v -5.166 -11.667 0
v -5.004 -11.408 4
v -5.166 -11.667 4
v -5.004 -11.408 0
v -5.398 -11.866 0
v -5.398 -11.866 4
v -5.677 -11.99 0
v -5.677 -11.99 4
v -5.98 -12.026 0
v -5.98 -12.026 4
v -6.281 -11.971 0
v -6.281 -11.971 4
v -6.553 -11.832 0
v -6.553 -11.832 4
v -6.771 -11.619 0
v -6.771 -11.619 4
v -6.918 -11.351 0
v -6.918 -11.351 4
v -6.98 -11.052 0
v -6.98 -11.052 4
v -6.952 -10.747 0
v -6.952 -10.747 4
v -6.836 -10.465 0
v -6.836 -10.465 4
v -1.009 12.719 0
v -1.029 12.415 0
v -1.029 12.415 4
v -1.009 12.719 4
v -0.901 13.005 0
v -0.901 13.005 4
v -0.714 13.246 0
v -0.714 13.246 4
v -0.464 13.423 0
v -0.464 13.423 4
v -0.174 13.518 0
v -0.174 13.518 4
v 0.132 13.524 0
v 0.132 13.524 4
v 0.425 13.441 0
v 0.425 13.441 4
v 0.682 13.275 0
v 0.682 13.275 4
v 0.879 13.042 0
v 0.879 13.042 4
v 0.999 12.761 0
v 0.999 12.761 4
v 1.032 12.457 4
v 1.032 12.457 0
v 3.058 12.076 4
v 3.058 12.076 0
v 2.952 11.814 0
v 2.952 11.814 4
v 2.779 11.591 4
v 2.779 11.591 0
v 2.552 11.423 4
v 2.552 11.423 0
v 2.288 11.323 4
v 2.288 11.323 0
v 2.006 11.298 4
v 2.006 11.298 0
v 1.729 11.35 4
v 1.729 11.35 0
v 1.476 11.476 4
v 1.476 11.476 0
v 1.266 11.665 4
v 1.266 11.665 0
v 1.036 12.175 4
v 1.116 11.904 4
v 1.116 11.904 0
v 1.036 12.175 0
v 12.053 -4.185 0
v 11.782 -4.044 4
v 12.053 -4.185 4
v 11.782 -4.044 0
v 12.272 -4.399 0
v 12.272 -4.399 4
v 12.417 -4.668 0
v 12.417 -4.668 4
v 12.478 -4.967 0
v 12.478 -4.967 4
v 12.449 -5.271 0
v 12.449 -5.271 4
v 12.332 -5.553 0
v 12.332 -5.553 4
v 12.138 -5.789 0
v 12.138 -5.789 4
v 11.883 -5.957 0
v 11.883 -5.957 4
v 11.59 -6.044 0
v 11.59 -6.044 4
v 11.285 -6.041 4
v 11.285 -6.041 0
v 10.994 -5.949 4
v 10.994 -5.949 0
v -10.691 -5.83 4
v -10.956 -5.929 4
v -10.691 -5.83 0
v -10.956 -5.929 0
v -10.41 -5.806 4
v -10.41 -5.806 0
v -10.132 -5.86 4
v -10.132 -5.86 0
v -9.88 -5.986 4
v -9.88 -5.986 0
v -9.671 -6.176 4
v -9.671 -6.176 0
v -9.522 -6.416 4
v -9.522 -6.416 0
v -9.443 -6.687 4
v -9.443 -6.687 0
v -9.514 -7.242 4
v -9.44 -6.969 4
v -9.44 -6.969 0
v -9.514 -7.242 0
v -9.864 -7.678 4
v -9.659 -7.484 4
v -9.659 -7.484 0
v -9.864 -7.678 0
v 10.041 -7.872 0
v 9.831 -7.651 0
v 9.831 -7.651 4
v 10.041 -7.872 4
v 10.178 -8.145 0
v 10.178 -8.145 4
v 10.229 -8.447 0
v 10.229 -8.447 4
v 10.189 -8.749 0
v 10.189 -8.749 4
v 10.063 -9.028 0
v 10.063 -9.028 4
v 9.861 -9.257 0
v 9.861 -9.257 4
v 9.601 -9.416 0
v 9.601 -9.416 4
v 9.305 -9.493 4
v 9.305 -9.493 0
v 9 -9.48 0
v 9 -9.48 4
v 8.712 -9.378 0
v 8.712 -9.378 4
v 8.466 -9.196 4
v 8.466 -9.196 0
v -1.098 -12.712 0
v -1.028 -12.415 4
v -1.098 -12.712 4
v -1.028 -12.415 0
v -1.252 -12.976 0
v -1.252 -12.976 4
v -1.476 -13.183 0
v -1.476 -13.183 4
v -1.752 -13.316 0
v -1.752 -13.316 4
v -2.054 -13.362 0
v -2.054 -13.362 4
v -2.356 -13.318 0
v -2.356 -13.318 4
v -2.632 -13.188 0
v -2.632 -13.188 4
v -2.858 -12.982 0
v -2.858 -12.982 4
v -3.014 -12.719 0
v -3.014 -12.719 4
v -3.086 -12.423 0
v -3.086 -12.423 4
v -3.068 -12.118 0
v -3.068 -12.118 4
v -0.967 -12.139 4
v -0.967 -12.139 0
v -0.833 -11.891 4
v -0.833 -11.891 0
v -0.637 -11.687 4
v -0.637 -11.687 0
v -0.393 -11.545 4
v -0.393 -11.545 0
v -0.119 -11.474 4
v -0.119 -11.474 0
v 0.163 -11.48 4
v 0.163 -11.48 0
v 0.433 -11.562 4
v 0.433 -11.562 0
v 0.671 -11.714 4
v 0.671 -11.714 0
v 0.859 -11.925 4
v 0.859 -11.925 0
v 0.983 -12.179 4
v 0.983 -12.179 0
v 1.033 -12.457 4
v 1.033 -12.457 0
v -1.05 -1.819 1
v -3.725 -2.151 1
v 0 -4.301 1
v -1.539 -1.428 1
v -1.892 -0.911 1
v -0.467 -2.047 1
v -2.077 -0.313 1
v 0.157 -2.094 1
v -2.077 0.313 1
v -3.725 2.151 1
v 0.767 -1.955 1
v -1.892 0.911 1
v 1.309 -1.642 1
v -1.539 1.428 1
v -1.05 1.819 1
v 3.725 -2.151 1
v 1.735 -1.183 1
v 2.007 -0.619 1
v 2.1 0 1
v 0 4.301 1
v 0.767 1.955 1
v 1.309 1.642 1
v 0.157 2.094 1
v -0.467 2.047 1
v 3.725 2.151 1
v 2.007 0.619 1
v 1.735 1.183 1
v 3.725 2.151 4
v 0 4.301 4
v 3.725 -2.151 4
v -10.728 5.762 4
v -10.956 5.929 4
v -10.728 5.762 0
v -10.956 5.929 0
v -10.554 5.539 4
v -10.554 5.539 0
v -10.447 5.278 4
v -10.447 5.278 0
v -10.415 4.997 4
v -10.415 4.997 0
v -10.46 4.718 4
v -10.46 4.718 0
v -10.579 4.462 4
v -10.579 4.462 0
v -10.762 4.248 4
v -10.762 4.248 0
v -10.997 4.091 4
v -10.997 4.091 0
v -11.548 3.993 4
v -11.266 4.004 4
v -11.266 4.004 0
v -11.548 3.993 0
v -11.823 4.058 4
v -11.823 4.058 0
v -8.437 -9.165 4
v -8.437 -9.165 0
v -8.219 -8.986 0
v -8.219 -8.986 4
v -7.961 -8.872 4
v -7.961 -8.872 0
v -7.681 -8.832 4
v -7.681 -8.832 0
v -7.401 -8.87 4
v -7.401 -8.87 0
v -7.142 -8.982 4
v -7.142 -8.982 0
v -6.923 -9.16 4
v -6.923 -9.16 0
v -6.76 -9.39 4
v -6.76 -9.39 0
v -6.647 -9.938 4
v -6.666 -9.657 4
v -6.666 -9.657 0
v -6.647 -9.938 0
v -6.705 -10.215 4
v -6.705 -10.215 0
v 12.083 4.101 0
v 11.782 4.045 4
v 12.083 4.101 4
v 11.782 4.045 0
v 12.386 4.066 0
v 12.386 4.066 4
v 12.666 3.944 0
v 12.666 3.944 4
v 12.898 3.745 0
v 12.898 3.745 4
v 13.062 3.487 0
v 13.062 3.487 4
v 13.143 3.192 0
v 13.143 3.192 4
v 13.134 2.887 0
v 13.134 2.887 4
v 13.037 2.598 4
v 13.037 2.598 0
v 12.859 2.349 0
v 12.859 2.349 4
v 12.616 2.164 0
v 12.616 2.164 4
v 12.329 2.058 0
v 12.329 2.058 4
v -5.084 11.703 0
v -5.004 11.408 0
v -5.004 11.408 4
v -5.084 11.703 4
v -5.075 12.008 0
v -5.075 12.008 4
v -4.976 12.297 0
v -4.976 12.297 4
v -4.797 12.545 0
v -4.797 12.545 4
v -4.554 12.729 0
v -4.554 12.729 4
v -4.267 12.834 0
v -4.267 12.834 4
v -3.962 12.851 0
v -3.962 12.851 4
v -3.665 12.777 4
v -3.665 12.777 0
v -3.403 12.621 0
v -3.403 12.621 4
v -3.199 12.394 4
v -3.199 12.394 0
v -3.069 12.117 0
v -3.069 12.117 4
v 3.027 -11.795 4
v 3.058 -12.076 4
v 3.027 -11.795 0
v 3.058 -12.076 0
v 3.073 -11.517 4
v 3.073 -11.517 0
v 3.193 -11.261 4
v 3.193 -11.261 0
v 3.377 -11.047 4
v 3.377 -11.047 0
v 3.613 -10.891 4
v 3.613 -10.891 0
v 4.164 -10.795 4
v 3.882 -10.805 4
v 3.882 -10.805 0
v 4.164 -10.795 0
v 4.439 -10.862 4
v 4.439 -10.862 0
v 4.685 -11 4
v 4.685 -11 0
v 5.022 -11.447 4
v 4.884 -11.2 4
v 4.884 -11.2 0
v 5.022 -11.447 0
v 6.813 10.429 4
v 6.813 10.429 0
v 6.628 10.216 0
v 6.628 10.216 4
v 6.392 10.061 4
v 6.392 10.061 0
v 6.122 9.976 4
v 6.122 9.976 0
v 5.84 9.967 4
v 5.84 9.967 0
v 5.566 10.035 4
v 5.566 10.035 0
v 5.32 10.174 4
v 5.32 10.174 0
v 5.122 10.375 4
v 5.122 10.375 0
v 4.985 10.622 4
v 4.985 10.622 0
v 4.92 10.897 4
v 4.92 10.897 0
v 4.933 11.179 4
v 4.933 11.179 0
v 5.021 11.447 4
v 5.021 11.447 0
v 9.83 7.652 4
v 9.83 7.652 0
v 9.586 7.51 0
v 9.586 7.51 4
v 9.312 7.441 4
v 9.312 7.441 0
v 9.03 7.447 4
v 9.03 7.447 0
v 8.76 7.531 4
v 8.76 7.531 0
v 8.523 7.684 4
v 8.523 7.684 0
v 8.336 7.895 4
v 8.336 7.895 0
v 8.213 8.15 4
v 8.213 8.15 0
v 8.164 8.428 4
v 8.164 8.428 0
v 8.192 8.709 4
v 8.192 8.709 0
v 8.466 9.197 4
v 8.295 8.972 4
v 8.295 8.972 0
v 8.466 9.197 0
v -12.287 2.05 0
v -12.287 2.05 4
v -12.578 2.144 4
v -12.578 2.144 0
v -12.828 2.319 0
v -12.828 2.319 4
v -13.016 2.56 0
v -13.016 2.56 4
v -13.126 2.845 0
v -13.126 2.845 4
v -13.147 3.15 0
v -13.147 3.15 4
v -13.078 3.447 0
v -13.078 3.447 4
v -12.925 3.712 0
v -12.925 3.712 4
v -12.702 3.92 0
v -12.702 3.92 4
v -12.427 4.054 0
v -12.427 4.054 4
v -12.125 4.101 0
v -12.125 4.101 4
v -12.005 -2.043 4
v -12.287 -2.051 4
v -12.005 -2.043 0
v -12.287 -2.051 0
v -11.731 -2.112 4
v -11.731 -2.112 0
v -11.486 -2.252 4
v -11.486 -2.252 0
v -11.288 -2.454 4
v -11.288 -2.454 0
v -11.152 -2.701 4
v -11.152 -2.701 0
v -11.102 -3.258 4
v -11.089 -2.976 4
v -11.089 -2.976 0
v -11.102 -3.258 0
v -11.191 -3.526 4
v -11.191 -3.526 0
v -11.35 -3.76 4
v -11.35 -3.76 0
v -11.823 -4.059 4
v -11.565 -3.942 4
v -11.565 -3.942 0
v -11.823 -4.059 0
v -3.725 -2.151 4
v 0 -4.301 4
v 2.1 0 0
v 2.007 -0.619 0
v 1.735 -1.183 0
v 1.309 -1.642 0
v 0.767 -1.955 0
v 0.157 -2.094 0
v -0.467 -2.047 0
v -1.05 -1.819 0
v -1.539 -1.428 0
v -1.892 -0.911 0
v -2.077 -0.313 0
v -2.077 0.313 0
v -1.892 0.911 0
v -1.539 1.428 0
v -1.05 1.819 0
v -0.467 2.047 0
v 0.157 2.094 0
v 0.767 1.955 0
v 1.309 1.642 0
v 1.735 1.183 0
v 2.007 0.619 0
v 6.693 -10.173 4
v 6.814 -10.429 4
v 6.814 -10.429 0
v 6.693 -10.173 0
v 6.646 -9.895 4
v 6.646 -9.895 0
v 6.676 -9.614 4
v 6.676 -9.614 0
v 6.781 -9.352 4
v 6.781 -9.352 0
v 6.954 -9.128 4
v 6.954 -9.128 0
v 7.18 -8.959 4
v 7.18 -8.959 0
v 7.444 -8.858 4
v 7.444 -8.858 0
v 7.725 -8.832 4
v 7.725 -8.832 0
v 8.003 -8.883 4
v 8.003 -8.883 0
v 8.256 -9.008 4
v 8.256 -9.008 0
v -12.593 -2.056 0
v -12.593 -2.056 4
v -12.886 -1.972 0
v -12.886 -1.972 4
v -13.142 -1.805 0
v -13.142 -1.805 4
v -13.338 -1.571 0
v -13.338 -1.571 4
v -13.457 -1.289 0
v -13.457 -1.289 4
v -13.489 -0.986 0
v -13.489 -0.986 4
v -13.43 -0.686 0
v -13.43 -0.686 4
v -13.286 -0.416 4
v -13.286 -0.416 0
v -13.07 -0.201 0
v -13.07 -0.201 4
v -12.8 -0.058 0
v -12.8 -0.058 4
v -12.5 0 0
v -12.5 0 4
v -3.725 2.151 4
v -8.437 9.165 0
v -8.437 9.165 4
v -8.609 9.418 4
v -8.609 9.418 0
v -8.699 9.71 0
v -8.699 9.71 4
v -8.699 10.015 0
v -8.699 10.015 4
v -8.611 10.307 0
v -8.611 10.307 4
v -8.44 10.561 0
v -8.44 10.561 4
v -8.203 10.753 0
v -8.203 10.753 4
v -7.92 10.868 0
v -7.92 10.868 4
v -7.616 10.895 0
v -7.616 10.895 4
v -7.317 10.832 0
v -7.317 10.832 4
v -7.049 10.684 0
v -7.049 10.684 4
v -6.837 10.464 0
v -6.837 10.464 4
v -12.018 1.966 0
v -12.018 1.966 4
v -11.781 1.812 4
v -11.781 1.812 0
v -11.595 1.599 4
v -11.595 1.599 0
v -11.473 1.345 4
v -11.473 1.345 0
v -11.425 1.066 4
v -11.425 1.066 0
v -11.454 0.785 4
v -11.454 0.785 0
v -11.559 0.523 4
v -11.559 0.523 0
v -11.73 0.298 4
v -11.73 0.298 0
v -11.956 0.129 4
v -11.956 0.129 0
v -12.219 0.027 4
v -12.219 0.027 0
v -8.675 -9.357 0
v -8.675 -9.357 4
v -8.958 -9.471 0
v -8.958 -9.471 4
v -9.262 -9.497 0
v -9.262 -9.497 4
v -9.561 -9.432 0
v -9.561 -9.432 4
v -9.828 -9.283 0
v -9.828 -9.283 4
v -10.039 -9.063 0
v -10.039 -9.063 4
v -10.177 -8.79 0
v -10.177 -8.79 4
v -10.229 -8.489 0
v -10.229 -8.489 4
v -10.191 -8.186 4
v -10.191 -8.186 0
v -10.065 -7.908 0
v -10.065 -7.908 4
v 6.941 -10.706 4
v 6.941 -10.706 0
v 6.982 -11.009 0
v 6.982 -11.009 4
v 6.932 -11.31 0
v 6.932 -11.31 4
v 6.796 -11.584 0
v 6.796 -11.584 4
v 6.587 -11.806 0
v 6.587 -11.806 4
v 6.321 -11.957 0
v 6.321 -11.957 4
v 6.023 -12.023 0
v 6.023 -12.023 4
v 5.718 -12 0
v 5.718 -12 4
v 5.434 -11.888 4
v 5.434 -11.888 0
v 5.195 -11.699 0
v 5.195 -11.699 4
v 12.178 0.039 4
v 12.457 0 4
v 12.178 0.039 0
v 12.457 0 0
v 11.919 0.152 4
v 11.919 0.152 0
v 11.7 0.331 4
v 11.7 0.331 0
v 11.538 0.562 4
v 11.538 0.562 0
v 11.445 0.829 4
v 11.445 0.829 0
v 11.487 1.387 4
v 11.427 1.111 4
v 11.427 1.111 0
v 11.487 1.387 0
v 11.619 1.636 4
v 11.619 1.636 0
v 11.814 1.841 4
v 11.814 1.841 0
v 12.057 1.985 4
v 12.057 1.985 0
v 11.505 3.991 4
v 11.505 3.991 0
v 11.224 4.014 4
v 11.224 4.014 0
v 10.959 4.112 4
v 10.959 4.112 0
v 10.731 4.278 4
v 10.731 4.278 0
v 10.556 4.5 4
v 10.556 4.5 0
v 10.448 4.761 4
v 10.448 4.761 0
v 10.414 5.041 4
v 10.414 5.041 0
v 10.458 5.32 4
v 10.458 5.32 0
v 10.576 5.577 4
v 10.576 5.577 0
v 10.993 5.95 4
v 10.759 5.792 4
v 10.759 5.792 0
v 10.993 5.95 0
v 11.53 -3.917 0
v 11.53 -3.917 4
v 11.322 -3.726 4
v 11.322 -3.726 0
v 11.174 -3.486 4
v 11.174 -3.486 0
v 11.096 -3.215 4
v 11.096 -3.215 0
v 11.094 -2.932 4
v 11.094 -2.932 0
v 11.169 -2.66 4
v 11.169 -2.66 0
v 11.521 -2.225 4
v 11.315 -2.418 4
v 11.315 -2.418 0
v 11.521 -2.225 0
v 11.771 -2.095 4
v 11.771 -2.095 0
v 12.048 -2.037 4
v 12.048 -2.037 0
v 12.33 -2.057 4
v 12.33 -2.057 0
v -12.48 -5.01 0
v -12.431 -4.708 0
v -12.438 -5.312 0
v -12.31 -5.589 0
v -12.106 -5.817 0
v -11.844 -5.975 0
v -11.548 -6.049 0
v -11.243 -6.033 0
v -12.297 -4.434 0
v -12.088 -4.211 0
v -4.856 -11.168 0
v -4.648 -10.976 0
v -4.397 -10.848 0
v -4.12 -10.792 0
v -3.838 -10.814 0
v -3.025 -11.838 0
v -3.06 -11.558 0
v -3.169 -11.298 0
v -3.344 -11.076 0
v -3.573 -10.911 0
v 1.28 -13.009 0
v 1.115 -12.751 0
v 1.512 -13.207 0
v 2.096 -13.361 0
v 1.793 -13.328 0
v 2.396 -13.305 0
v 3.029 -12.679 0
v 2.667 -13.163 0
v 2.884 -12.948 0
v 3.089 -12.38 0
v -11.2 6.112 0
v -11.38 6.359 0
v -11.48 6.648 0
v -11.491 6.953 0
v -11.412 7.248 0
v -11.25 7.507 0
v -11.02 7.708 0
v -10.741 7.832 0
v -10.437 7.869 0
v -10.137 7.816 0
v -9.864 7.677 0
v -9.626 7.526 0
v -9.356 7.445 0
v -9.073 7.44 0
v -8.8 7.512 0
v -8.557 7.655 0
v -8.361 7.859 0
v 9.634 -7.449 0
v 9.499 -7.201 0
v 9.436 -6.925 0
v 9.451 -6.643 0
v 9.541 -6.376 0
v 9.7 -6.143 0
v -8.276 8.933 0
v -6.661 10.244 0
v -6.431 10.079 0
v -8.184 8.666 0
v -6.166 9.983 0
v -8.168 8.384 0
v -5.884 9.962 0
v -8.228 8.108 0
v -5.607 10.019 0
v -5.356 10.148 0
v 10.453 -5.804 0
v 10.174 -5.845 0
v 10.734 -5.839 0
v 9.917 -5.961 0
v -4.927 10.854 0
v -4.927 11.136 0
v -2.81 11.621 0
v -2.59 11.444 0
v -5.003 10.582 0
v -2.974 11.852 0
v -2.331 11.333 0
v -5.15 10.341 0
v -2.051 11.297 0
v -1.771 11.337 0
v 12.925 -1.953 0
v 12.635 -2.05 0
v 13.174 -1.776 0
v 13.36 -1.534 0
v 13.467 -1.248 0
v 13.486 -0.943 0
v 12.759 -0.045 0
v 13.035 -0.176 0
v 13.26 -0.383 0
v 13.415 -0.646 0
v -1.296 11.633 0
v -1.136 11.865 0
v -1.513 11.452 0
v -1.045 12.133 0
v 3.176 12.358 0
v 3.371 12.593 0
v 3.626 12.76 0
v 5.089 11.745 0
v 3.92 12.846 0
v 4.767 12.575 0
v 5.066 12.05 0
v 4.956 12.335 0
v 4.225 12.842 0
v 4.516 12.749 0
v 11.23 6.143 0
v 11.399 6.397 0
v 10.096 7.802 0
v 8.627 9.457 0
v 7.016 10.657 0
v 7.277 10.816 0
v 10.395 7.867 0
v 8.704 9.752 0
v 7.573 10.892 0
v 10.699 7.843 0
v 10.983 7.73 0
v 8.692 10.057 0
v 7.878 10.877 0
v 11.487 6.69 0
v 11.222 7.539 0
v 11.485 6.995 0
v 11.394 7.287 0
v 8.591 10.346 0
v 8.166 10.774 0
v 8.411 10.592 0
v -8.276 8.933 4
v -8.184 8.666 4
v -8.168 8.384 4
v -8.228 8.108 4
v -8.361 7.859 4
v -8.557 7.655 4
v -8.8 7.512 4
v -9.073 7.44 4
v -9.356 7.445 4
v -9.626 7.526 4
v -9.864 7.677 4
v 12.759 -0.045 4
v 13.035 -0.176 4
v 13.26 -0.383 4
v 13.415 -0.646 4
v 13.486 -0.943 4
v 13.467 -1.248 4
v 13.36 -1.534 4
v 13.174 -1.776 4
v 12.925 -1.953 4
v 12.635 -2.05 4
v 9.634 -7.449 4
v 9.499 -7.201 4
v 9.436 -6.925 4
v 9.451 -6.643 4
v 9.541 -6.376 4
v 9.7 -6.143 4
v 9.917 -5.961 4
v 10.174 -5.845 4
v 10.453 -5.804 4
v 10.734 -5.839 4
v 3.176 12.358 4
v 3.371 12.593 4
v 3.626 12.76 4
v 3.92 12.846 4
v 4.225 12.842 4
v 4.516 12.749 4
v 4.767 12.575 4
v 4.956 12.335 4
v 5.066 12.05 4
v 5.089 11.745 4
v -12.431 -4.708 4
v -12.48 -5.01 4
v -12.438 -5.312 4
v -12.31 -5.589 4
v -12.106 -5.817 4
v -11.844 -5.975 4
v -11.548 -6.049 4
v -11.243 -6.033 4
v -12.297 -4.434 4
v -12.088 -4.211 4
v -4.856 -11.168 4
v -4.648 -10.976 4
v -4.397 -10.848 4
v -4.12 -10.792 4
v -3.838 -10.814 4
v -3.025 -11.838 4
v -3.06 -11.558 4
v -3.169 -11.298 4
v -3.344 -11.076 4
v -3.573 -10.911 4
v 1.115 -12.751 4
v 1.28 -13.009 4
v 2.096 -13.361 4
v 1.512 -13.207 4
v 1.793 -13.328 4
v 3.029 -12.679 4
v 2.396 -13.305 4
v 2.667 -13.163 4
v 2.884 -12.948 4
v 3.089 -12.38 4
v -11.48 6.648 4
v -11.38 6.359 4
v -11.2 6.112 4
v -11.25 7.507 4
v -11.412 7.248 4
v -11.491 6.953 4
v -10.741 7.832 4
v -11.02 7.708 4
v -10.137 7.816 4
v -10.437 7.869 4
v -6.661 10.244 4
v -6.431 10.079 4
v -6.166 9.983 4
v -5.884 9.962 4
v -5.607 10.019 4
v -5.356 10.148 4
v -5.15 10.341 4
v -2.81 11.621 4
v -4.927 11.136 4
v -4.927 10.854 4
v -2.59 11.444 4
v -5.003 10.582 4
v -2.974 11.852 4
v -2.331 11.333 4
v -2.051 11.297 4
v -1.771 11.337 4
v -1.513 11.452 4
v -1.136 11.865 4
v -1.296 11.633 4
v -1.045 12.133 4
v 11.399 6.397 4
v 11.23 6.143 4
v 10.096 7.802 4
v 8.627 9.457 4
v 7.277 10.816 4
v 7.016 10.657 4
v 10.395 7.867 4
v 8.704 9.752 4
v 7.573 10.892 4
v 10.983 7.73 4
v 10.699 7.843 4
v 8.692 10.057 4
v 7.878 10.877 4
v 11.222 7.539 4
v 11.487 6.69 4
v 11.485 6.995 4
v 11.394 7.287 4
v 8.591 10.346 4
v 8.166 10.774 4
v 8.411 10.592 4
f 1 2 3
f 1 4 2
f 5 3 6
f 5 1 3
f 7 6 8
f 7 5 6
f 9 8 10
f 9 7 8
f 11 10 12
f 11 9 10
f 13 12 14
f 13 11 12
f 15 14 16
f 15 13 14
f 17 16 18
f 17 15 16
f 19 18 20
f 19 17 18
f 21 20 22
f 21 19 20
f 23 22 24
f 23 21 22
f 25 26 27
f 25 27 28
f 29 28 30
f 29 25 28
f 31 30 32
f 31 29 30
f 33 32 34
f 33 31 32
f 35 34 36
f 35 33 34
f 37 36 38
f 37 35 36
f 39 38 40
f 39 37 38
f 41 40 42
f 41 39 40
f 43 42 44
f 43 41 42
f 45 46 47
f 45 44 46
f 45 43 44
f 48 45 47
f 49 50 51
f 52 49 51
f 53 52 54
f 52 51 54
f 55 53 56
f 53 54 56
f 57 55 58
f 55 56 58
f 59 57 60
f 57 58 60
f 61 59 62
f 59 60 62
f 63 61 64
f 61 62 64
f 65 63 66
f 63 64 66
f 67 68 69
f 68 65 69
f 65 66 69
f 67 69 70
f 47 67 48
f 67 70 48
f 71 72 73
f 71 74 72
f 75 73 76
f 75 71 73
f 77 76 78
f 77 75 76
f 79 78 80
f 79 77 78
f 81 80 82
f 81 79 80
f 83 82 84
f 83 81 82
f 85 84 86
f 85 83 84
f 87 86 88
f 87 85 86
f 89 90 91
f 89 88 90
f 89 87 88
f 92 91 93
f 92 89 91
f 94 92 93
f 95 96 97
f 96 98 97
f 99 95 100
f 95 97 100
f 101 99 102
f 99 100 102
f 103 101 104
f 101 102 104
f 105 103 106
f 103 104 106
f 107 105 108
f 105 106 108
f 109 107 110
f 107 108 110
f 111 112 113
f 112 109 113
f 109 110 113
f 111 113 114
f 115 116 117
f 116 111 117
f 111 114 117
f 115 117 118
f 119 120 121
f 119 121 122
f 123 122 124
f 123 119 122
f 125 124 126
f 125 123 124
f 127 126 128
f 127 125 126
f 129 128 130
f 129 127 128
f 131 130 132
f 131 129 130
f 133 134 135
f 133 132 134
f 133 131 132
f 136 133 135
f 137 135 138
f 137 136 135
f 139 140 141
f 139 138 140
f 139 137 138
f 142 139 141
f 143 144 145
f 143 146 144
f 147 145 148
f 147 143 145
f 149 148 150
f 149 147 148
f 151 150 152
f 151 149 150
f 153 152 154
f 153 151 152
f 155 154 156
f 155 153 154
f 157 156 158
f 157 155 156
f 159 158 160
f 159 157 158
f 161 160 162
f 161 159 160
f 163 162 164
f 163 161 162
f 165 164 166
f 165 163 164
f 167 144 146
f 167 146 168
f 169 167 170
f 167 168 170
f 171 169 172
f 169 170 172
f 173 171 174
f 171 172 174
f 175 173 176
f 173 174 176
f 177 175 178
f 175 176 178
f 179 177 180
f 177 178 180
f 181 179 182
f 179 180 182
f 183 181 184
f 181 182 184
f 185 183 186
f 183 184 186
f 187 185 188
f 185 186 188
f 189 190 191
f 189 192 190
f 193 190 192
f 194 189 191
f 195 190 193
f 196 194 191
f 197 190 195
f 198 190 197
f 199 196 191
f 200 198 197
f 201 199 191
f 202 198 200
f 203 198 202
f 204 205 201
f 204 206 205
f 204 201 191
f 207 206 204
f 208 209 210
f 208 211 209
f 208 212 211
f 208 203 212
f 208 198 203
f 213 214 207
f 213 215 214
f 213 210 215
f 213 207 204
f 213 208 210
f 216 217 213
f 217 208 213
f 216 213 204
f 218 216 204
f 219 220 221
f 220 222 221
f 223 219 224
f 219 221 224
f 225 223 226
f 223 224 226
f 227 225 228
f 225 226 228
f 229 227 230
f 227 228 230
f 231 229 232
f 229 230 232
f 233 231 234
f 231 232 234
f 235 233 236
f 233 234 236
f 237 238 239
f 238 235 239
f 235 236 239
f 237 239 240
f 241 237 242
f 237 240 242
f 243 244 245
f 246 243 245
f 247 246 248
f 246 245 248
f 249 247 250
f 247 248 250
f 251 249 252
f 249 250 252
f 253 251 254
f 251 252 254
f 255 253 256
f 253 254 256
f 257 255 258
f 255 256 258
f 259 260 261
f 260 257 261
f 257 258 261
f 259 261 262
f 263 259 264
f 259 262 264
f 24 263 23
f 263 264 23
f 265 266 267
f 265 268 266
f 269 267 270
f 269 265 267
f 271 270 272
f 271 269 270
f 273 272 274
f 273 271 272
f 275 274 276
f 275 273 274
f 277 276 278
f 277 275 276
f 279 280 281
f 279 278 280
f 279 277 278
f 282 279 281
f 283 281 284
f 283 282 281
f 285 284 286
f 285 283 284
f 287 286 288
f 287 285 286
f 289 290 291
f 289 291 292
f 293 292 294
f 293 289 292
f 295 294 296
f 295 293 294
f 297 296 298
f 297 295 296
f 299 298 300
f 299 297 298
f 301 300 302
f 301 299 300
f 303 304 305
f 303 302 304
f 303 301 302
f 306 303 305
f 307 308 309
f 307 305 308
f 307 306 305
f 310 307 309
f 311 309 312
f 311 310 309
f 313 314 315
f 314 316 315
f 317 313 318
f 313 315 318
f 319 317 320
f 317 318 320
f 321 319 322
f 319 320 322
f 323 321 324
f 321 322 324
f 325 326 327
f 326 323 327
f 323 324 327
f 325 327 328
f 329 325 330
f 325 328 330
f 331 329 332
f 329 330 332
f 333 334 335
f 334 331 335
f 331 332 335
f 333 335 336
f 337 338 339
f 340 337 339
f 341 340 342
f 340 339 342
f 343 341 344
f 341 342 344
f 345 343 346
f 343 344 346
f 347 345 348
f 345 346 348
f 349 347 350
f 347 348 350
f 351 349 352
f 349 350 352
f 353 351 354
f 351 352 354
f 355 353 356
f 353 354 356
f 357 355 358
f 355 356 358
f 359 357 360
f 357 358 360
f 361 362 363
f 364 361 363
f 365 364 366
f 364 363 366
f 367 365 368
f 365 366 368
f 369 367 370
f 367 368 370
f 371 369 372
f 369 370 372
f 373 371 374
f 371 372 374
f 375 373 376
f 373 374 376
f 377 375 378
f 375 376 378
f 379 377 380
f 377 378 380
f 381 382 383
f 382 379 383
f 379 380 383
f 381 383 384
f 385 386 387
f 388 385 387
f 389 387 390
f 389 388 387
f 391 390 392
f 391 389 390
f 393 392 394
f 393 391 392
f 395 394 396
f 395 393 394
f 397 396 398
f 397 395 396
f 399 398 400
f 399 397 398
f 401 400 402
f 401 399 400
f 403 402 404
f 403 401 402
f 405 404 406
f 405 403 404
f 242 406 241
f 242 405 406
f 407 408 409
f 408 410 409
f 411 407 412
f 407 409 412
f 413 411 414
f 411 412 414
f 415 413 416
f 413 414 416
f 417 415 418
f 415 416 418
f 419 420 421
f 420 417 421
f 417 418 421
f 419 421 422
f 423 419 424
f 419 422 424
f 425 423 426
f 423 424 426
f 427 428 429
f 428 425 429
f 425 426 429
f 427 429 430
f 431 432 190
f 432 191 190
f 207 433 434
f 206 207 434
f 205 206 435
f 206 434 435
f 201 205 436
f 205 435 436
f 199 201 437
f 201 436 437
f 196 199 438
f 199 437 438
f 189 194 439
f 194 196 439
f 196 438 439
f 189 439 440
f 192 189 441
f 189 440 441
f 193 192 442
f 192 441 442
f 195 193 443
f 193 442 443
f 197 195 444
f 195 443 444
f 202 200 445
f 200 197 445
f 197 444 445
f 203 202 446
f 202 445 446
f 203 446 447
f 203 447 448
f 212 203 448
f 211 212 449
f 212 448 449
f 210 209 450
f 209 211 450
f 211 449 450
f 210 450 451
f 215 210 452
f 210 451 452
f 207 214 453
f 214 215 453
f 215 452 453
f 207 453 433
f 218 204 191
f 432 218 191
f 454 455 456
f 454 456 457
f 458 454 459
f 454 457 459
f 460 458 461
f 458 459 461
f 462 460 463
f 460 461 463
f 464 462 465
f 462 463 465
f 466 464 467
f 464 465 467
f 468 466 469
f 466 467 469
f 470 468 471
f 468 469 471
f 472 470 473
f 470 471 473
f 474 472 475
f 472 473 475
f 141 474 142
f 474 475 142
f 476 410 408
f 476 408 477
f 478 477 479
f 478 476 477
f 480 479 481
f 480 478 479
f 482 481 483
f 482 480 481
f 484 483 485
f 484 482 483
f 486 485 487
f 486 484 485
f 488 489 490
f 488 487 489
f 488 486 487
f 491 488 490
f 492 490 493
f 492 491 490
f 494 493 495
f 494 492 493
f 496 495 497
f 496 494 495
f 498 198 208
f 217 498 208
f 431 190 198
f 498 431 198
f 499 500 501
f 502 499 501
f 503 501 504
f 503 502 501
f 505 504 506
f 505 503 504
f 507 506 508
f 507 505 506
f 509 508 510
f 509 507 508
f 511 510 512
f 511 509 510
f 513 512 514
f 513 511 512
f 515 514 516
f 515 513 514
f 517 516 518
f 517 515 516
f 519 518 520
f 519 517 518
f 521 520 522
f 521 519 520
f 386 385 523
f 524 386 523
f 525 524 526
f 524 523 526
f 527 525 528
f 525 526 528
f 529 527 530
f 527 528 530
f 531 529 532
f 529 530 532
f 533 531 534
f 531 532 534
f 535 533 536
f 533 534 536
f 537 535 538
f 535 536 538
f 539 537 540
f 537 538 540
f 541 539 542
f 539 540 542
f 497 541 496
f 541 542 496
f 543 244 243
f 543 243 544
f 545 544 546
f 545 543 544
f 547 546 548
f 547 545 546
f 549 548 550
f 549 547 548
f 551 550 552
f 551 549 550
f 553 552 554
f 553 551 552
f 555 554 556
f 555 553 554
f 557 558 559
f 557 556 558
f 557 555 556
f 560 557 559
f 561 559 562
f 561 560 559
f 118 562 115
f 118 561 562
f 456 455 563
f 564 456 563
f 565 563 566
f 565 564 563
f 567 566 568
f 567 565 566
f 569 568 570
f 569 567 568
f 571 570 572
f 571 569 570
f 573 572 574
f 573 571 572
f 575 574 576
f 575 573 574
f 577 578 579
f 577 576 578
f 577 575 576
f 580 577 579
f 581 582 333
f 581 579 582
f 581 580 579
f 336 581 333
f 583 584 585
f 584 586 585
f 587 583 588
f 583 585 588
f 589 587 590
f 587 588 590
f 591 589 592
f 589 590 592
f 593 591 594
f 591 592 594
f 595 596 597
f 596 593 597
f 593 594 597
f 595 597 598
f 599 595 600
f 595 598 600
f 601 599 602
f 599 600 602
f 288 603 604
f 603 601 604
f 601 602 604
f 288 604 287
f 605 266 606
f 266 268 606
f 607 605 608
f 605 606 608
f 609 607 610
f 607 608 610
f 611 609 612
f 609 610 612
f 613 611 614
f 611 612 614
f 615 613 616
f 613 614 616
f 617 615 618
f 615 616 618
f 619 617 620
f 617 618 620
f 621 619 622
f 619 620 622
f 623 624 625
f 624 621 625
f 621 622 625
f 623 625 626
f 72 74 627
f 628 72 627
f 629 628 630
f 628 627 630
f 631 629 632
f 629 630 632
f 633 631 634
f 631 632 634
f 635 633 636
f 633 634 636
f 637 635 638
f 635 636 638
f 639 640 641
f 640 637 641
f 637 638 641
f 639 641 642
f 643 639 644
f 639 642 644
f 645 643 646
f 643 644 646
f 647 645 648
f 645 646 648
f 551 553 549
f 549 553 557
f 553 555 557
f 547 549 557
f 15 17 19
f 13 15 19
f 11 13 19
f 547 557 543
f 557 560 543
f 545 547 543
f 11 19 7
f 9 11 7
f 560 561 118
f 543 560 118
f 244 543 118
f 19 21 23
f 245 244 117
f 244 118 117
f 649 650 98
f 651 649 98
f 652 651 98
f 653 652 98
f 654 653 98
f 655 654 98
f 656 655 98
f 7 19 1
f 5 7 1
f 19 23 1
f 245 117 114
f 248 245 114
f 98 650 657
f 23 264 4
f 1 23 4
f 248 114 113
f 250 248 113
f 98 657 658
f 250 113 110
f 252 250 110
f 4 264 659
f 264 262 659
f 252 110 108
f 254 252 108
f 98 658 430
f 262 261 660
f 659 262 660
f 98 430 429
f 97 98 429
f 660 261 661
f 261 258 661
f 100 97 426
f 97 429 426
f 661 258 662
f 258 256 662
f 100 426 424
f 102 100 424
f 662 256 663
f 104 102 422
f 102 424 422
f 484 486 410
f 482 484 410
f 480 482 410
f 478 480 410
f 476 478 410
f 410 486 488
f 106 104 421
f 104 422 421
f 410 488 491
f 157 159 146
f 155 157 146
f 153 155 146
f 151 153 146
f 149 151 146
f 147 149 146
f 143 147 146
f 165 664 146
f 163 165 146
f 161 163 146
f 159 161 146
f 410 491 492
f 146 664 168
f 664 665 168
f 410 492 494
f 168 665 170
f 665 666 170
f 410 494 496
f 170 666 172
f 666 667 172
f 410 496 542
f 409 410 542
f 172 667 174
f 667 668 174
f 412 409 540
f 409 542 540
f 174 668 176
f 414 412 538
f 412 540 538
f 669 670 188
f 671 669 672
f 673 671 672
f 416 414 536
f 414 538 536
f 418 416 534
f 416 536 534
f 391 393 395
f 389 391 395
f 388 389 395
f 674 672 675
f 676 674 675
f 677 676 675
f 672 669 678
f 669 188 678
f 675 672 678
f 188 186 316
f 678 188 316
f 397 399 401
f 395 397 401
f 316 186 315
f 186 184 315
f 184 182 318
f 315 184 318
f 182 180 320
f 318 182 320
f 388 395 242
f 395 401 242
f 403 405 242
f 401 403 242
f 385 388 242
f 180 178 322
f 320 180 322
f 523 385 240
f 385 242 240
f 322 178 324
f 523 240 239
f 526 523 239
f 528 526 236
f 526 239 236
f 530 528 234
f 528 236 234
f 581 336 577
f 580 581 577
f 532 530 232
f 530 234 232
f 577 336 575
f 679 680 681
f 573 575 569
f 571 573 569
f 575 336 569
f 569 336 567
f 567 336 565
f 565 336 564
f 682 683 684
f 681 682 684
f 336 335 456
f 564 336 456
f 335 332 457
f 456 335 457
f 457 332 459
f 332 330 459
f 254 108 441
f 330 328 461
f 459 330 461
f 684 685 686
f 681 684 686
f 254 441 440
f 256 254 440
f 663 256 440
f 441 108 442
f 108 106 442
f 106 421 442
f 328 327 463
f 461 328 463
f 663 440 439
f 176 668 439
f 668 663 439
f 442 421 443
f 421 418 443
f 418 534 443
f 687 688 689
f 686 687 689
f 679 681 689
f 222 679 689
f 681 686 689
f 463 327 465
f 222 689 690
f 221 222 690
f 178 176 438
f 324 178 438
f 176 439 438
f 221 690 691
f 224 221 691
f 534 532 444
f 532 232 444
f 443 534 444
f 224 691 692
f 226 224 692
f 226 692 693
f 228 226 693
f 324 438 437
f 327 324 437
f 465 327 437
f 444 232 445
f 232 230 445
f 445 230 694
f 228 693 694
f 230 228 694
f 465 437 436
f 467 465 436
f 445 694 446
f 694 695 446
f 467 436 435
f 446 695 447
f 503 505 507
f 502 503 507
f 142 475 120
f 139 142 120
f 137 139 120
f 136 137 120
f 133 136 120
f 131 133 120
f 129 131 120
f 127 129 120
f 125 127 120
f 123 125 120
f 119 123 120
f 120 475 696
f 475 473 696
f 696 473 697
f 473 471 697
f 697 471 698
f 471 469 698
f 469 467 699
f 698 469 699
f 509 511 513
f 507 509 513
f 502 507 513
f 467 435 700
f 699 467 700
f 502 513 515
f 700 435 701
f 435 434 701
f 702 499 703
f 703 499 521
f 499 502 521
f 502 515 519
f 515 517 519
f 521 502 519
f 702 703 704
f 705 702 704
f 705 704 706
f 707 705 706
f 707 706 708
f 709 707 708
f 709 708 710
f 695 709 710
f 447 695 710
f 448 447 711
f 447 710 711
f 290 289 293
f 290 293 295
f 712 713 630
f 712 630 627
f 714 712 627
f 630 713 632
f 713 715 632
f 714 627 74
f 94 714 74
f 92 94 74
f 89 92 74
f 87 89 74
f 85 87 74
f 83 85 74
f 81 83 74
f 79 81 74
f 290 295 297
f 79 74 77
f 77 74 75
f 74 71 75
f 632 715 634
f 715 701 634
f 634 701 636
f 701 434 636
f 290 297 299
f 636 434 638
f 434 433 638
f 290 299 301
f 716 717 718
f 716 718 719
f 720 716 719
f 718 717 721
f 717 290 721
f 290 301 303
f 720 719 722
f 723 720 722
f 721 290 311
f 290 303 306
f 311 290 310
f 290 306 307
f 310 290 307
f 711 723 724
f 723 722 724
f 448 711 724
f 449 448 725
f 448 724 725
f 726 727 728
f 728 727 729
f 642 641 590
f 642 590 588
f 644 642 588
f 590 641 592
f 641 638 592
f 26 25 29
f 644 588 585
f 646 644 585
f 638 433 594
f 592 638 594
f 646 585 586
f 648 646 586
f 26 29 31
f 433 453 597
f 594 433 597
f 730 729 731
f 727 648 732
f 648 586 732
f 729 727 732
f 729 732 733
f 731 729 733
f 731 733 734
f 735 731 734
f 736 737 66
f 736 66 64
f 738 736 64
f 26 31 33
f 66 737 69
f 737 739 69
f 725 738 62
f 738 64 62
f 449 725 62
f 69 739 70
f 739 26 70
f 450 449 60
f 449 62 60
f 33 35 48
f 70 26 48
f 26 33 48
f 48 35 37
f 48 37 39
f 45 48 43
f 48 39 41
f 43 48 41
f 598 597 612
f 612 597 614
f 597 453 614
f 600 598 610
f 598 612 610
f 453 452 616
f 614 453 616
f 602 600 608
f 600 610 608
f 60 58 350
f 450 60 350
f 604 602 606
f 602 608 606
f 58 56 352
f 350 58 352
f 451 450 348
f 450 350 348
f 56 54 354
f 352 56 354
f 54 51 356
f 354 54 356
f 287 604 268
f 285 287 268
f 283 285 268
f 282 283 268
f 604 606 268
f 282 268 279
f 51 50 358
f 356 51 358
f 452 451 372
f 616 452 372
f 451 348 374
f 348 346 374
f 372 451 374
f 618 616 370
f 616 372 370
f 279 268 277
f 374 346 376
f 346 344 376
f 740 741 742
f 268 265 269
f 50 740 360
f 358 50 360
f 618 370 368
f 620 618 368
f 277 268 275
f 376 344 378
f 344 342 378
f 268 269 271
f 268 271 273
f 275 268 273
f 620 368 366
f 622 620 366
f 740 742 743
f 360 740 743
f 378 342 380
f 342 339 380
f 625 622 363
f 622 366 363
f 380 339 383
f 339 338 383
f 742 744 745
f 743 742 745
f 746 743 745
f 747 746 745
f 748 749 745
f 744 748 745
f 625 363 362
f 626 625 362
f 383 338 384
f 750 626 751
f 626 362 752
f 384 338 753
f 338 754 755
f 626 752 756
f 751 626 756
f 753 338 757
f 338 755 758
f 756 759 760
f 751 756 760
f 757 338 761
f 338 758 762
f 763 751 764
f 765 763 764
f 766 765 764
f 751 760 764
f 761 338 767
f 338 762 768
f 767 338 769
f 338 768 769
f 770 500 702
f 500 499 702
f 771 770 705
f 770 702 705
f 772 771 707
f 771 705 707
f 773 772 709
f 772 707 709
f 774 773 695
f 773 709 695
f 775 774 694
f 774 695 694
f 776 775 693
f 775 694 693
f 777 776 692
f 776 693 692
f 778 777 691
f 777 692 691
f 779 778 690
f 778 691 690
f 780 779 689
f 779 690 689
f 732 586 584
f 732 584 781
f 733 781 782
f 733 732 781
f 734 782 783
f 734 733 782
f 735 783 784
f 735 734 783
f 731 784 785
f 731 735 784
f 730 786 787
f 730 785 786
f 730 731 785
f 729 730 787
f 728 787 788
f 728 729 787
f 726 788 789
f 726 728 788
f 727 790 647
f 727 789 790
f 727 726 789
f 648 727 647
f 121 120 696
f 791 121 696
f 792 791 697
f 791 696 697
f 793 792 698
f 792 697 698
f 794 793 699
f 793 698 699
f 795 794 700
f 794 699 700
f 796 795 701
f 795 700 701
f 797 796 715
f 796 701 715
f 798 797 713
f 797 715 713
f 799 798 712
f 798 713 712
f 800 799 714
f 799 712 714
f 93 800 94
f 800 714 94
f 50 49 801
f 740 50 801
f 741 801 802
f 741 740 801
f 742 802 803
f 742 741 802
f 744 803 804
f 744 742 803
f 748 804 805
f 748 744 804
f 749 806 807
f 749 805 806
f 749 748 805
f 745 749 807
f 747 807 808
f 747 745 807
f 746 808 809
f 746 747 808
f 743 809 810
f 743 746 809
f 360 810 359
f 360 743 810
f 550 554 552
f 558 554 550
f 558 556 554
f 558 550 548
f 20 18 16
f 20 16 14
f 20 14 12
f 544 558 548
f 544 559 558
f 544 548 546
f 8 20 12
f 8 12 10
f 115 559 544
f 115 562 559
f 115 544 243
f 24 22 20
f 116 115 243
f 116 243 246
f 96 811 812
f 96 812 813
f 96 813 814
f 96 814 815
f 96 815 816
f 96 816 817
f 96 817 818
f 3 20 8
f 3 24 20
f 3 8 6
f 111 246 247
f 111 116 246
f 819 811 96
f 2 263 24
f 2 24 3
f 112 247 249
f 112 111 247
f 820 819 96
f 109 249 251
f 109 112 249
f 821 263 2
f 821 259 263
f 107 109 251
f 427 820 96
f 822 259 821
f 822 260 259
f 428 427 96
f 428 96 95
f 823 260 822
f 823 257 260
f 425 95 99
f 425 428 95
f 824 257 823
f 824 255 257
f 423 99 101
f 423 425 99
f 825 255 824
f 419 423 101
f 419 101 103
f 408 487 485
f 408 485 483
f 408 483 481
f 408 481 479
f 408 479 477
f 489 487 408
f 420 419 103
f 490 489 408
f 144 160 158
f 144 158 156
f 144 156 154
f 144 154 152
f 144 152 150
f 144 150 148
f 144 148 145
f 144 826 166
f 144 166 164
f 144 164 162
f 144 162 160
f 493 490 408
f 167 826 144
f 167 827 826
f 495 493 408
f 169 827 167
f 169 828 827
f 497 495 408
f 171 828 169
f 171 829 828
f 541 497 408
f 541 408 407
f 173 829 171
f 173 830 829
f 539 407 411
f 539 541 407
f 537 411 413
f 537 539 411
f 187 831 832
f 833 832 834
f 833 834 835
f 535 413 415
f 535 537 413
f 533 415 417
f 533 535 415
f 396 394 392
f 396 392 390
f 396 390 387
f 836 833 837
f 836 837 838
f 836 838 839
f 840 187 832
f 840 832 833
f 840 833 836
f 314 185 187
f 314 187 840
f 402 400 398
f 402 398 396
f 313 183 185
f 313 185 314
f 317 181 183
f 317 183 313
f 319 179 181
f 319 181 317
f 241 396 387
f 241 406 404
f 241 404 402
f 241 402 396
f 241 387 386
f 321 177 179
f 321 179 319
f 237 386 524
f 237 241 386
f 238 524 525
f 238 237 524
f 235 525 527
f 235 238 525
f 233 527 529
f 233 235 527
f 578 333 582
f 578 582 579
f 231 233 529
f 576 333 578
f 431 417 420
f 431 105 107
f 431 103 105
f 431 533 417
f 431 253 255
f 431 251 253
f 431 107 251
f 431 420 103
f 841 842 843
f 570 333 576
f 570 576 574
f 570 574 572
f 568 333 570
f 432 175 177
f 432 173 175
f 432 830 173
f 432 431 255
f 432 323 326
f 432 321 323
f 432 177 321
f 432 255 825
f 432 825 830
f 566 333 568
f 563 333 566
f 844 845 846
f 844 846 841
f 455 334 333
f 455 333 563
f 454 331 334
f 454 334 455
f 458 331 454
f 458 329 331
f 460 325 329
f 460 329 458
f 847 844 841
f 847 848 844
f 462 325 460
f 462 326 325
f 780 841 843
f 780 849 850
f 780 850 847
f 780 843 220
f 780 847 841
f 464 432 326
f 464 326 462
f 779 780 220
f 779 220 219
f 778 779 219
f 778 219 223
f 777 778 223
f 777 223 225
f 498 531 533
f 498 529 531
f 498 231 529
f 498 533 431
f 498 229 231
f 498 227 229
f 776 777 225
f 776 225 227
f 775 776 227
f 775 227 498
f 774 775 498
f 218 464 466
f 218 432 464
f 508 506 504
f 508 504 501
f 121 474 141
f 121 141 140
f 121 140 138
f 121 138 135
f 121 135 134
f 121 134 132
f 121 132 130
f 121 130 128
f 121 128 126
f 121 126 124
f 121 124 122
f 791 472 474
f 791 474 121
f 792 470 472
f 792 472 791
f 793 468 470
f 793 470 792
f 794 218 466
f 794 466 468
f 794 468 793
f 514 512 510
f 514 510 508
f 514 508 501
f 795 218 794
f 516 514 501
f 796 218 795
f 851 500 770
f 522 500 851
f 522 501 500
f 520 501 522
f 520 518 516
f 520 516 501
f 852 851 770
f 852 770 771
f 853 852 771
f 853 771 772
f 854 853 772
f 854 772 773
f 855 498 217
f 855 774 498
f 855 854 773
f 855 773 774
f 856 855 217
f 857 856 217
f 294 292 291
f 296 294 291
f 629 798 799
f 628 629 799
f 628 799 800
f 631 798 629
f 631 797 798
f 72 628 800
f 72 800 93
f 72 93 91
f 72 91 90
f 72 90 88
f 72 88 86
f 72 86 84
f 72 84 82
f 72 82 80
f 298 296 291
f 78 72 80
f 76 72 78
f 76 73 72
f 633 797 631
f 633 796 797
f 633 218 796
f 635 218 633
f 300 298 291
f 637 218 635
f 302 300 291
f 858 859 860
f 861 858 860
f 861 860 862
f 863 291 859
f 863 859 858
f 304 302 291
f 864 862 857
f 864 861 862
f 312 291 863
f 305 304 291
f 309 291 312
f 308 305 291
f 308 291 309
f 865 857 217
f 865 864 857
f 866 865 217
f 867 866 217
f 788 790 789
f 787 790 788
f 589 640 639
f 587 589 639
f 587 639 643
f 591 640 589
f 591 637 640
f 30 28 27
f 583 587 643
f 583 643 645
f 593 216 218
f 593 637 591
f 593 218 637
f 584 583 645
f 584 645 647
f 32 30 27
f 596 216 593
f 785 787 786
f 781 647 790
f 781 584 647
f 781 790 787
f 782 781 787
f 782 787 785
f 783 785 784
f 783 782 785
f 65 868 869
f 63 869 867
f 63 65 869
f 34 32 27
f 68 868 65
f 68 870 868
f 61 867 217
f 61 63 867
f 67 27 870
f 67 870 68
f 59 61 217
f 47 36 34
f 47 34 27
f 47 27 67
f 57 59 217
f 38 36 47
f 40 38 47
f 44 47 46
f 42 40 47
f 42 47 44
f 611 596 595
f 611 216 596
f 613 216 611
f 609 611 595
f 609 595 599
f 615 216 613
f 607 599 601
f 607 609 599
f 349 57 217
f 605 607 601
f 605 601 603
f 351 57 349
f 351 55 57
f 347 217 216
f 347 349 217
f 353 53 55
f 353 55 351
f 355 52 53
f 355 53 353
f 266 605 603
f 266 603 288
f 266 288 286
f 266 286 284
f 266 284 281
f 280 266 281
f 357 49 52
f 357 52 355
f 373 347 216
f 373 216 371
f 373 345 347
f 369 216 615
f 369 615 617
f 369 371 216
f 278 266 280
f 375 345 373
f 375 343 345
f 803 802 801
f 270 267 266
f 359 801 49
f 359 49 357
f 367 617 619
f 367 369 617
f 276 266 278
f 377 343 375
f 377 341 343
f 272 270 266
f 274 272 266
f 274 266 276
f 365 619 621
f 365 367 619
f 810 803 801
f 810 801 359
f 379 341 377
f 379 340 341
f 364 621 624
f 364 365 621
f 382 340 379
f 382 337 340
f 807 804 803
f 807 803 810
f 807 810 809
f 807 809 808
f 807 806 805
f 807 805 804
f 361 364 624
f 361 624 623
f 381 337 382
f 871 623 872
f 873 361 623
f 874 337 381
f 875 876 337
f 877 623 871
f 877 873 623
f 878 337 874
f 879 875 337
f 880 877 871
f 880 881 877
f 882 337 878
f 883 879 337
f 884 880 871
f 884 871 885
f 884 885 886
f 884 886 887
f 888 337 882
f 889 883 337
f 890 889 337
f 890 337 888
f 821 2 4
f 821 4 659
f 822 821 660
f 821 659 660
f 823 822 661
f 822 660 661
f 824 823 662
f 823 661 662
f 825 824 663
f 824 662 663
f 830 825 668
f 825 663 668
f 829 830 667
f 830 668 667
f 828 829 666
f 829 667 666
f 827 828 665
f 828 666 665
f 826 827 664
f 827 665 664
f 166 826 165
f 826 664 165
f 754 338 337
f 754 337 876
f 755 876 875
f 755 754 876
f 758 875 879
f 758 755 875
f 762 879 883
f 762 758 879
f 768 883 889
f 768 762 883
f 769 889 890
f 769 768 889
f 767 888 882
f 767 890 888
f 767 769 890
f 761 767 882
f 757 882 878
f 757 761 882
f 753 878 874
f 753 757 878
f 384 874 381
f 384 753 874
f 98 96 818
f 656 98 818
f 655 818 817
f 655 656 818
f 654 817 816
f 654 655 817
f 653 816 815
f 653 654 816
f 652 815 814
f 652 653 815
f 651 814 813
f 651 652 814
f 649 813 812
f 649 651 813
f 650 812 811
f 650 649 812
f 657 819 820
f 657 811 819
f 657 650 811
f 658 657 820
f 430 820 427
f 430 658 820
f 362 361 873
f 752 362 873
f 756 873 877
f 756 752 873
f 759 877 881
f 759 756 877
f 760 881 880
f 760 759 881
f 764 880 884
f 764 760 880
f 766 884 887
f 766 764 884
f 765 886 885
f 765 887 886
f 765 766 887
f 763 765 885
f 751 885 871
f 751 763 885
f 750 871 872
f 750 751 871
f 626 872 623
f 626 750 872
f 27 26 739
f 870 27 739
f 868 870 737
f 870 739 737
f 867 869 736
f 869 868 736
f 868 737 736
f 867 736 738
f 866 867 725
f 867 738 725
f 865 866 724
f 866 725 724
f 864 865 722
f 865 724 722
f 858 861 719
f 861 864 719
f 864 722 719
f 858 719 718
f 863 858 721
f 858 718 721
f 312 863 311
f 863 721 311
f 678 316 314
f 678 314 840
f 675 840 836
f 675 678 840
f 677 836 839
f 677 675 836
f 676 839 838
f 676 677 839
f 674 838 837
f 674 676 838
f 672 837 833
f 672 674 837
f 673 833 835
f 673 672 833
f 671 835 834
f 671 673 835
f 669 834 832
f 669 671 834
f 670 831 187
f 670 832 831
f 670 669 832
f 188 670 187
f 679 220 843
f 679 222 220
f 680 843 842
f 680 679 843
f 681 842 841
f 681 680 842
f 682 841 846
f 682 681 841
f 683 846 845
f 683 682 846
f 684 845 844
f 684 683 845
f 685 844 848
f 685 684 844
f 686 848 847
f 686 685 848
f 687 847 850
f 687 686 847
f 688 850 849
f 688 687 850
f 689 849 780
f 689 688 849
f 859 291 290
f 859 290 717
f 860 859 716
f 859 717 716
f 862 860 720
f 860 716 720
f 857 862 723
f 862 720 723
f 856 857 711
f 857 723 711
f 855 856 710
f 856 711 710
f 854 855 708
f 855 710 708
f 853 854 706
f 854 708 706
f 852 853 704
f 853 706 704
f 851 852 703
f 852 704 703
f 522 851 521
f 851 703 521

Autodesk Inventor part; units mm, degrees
ref_plane "YZ Plane" through (0, 0, 0) normal (1, 0, 0) x (0, 1, 0)
ref_plane "XZ Plane" through (0, 0, 0) normal (0, 1, 0) x (-1, 0, 0)
ref_plane "XY Plane" through (0, 0, 0) normal (0, 0, 1) x (1, 0, 0)
sketch "Эскиз1" plane through (0, 0, 0) normal (0, 0, 1) x (1, 0, 0)
  line L0 (0, 4.3013) -> (3.725, 2.1506)
  line L1 (3.725, 2.1506) -> (3.725, -2.1506)
  line L2 (3.725, -2.1506) -> (0, -4.3013)
  line L3 (0, -4.3013) -> (-3.725, -2.1506)
  line L4 (-3.725, -2.1506) -> (-3.725, 2.1506)
  line L5 (-3.725, 2.1506) -> (0, 4.3013)
  circle A0 centre (0, 0) radius 12.5 construction
  arc A1 (1.0318, 12.4573) -> (-1.0292, 12.4147) centre (0, 12.5) ccw
  arc A2 (-1.0292, 12.4147) -> (-3.069, 12.1174) centre (-2.0583, 12.3294) ccw construction
  arc A3 (-3.069, 12.1174) -> (-1.0292, 12.4147) centre (-2.0583, 12.3294) ccw
  arc A4 (-1.0292, 12.4147) -> (1.0318, 12.4573) centre (0, 12.5) ccw construction
  arc A5 (-3.069, 12.1174) -> (-5.0044, 11.4079) centre (-4.0587, 11.8227) ccw
  arc A6 (-5.0044, 11.4079) -> (-6.8372, 10.4643) centre (-5.9501, 10.993) ccw construction
  arc A7 (-6.8372, 10.4643) -> (-5.0044, 11.4079) centre (-5.9501, 10.993) ccw
  arc A8 (-5.0044, 11.4079) -> (-3.069, 12.1174) centre (-4.0587, 11.8227) ccw construction
  arc A9 (-6.8372, 10.4643) -> (-8.4374, 9.1648) centre (-7.6777, 9.8643) ccw
  arc A10 (-8.4374, 9.1648) -> (-9.8645, 7.6773) centre (-9.1971, 8.4654) ccw construction
  arc A11 (-9.8645, 7.6773) -> (-8.4374, 9.1648) centre (-9.1971, 8.4654) ccw
  arc A12 (-8.4374, 9.1648) -> (-6.8372, 10.4643) centre (-7.6777, 9.8643) ccw construction
  arc A13 (-9.8645, 7.6773) -> (-10.9561, 5.9286) centre (-10.4646, 6.8369) ccw
  arc A14 (-10.9561, 5.9286) -> (-11.8229, 4.0583) centre (-11.4475, 5.0204) ccw construction
  arc A15 (-11.8229, 4.0583) -> (-10.9561, 5.9286) centre (-11.4475, 5.0204) ccw
  arc A16 (-10.9561, 5.9286) -> (-9.8645, 7.6773) centre (-10.4646, 6.8369) ccw construction
  arc A17 (-11.8229, 4.0583) -> (-12.2874, 2.05) centre (-12.1175, 3.0686) ccw
  arc A18 (-12.2874, 2.05) -> (-12.5, -0.0004) centre (-12.4574, 1.0314) ccw construction
  arc A19 (-12.5, -0.0004) -> (-12.2874, 2.05) centre (-12.4574, 1.0314) ccw
  arc A20 (-12.2874, 2.05) -> (-11.8229, 4.0583) centre (-12.1175, 3.0686) ccw construction
  arc A21 (-12.5, -0.0004) -> (-12.2873, -2.0508) centre (-12.4573, -1.0322) ccw
  arc A22 (-12.2873, -2.0508) -> (-11.8226, -4.0592) centre (-12.1173, -3.0694) ccw construction
  arc A23 (-11.8226, -4.0592) -> (-12.2873, -2.0508) centre (-12.1173, -3.0694) ccw
  arc A24 (-12.2873, -2.0508) -> (-12.5, -0.0004) centre (-12.4573, -1.0322) ccw construction
  arc A25 (-11.8226, -4.0592) -> (-10.9556, -5.9294) centre (-11.4472, -5.0212) ccw
  arc A26 (-10.9556, -5.9294) -> (-9.864, -7.678) centre (-10.4641, -6.8376) ccw construction
  arc A27 (-9.864, -7.678) -> (-10.9556, -5.9294) centre (-10.4641, -6.8376) ccw
  arc A28 (-10.9556, -5.9294) -> (-11.8226, -4.0592) centre (-11.4472, -5.0212) ccw construction
  arc A29 (-9.864, -7.678) -> (-8.4368, -9.1654) centre (-9.1965, -8.466) ccw
  arc A30 (-8.4368, -9.1654) -> (-6.8365, -10.4648) centre (-7.677, -9.8648) ccw construction
  arc A31 (-6.8365, -10.4648) -> (-8.4368, -9.1654) centre (-7.677, -9.8648) ccw
  arc A32 (-8.4368, -9.1654) -> (-9.864, -7.678) centre (-9.1965, -8.466) ccw construction
  arc A33 (-6.8365, -10.4648) -> (-5.0036, -11.4082) centre (-5.9493, -10.9934) ccw
  arc A34 (-5.0036, -11.4082) -> (-3.0681, -12.1176) centre (-4.0579, -11.823) ccw construction
  arc A35 (-3.0681, -12.1176) -> (-5.0036, -11.4082) centre (-4.0579, -11.823) ccw
  arc A36 (-5.0036, -11.4082) -> (-6.8365, -10.4648) centre (-5.9493, -10.9934) ccw construction
  arc A37 (-3.0681, -12.1176) -> (-1.0283, -12.4148) centre (-2.0574, -12.3295) ccw
  arc A38 (-1.0283, -12.4148) -> (1.0327, -12.4573) centre (0.0009, -12.5) ccw construction
  arc A39 (1.0327, -12.4573) -> (-1.0283, -12.4148) centre (0.0009, -12.5) ccw
  arc A40 (-1.0283, -12.4148) -> (-3.0681, -12.1176) centre (-2.0574, -12.3295) ccw construction
  arc A41 (1.0327, -12.4573) -> (3.0585, -12.076) centre (2.0574, -12.3295) ccw
  arc A42 (3.0585, -12.076) -> (5.0216, -11.447) centre (4.0596, -11.8224) ccw construction
  arc A43 (5.0216, -11.447) -> (3.0585, -12.076) centre (4.0596, -11.8224) ccw
  arc A44 (3.0585, -12.076) -> (1.0327, -12.4573) centre (2.0574, -12.3295) ccw construction
  arc A45 (5.0216, -11.447) -> (6.8138, -10.4286) centre (5.9493, -10.9934) ccw
  arc A46 (6.8138, -10.4286) -> (8.4663, -9.1962) centre (7.6784, -9.8637) ccw construction
  arc A47 (8.4663, -9.1962) -> (6.8138, -10.4286) centre (7.6784, -9.8637) ccw
  arc A48 (6.8138, -10.4286) -> (5.0216, -11.447) centre (5.9493, -10.9934) ccw construction
  arc A49 (8.4663, -9.1962) -> (9.8308, -7.6511) centre (9.1965, -8.466) ccw
  arc A50 (9.8308, -7.6511) -> (10.9936, -5.949) centre (10.4651, -6.8361) ccw construction
  arc A51 (10.9936, -5.949) -> (9.8308, -7.6511) centre (10.4651, -6.8361) ccw
  arc A52 (9.8308, -7.6511) -> (8.4663, -9.1962) centre (9.1965, -8.466) ccw construction
  arc A53 (10.9936, -5.949) -> (11.7824, -4.0445) centre (11.4472, -5.0212) ccw
  arc A54 (11.7824, -4.0445) -> (12.3296, -2.057) centre (12.1177, -3.0677) ccw construction
  arc A55 (12.3296, -2.057) -> (11.7824, -4.0445) centre (12.1177, -3.0677) ccw
  arc A56 (11.7824, -4.0445) -> (10.9936, -5.949) centre (11.4472, -5.0212) ccw construction
  arc A57 (12.3296, -2.057) -> (12.4573, 0.0004) centre (12.4573, -1.0322) ccw
  arc A58 (12.4573, 0.0004) -> (12.3294, 2.0579) centre (12.4572, 1.0331) ccw construction
  arc A59 (12.3294, 2.0579) -> (12.4573, 0.0004) centre (12.4572, 1.0331) ccw
  arc A60 (12.4573, 0.0004) -> (12.3296, -2.057) centre (12.4573, -1.0322) ccw construction
  arc A61 (12.3294, 2.0579) -> (11.7822, 4.0453) centre (12.1175, 3.0686) ccw
  arc A62 (11.7822, 4.0453) -> (10.9932, 5.9497) centre (11.4468, 5.022) ccw construction
  arc A63 (10.9932, 5.9497) -> (11.7822, 4.0453) centre (11.4468, 5.022) ccw
  arc A64 (11.7822, 4.0453) -> (12.3294, 2.0579) centre (12.1175, 3.0686) ccw construction
  arc A65 (10.9932, 5.9497) -> (9.8303, 7.6518) centre (10.4646, 6.8369) ccw
  arc A66 (9.8303, 7.6518) -> (8.4657, 9.1968) centre (9.1959, 8.4667) ccw construction
  arc A67 (8.4657, 9.1968) -> (9.8303, 7.6518) centre (9.1959, 8.4667) ccw
  arc A68 (9.8303, 7.6518) -> (10.9932, 5.9497) centre (10.4646, 6.8369) ccw construction
  arc A69 (8.4657, 9.1968) -> (6.8131, 10.429) centre (7.6777, 9.8643) ccw
  arc A70 (6.8131, 10.429) -> (5.0208, 11.4473) centre (5.9486, 10.9938) ccw construction
  arc A71 (5.0208, 11.4473) -> (6.8131, 10.429) centre (5.9486, 10.9938) ccw
  arc A72 (6.8131, 10.429) -> (8.4657, 9.1968) centre (7.6777, 9.8643) ccw construction
  arc A73 (5.0208, 11.4473) -> (3.0577, 12.0762) centre (4.0587, 11.8227) ccw
  arc A74 (3.0577, 12.0762) -> (1.0318, 12.4573) centre (2.0566, 12.3297) ccw construction
  arc A75 (1.0318, 12.4573) -> (3.0577, 12.0762) centre (2.0566, 12.3297) ccw
  arc A76 (3.0577, 12.0762) -> (5.0208, 11.4473) centre (4.0587, 11.8227) ccw construction
  circle A77 centre (0, 0) radius 2.1
  point P0 (-1.0318, 12.4573)
  point P1 (-5.0208, 11.4473)
  point P2 (-8.4657, 9.1968)
  point P3 (-10.9932, 5.9497)
  point P4 (-12.3294, 2.0579)
  point P5 (-12.3296, -2.057)
  point P6 (-10.9936, -5.949)
  point P7 (-8.4663, -9.1962)
  point P8 (-5.0216, -11.447)
  point P9 (-1.0327, -12.4573)
  point P10 (3.0681, -12.1176)
  point P11 (6.8365, -10.4648)
  point P12 (9.864, -7.678)
  point P13 (11.8226, -4.0592)
  point P14 (12.5, -0.0004)
  point P15 (11.8229, 4.0583)
  point P16 (9.8645, 7.6773)
  point P17 (6.8372, 10.4643)
  point P18 (3.069, 12.1174)
  point P19 (5.0208, 11.4473)
  point P20 (1.0318, 12.4573)
  point P21 (-3.069, 12.1174)
  point P22 (-9.8645, 7.6773)
  point P23 (-12.5, -0.0004)
  point P24 (-11.8226, -4.0592)
  point P25 (-9.864, -7.678)
  point P26 (-6.8365, -10.4648)
  point P27 (-3.0681, -12.1176)
  point P28 (1.0327, -12.4573)
  point P29 (5.0216, -11.447)
  point P30 (8.4663, -9.1962)
  point P31 (12.3296, -2.057)
  point P32 (12.3294, 2.0579)
  point P33 (10.9932, 5.9497)
  point P34 (8.4657, 9.1968)
  dimension "d0" = 7.45
  dimension "d1" = 25
  dimension "d6" = 360
  dimension "d8" = 4.2
extrude "Выдавливание1" add sketch "Эскиз1" along normal blind 4 contours A75 A73 A71 A69 A67 A65 A63 A61 A59 A57 A55 A53 A51 A49 A47 A45 A43 A41 A39 A37 A35 A33 A31 A29 A27 A25 A23 A21 A19 A17 A15 A13 A11 A9 A7 A5 A3 A1
extrude "Выдавливание2" add sketch "Эскиз1" along normal blind 1 contours L0 L1 L2 L3 L4 L5
properties part number "X_belt3"
